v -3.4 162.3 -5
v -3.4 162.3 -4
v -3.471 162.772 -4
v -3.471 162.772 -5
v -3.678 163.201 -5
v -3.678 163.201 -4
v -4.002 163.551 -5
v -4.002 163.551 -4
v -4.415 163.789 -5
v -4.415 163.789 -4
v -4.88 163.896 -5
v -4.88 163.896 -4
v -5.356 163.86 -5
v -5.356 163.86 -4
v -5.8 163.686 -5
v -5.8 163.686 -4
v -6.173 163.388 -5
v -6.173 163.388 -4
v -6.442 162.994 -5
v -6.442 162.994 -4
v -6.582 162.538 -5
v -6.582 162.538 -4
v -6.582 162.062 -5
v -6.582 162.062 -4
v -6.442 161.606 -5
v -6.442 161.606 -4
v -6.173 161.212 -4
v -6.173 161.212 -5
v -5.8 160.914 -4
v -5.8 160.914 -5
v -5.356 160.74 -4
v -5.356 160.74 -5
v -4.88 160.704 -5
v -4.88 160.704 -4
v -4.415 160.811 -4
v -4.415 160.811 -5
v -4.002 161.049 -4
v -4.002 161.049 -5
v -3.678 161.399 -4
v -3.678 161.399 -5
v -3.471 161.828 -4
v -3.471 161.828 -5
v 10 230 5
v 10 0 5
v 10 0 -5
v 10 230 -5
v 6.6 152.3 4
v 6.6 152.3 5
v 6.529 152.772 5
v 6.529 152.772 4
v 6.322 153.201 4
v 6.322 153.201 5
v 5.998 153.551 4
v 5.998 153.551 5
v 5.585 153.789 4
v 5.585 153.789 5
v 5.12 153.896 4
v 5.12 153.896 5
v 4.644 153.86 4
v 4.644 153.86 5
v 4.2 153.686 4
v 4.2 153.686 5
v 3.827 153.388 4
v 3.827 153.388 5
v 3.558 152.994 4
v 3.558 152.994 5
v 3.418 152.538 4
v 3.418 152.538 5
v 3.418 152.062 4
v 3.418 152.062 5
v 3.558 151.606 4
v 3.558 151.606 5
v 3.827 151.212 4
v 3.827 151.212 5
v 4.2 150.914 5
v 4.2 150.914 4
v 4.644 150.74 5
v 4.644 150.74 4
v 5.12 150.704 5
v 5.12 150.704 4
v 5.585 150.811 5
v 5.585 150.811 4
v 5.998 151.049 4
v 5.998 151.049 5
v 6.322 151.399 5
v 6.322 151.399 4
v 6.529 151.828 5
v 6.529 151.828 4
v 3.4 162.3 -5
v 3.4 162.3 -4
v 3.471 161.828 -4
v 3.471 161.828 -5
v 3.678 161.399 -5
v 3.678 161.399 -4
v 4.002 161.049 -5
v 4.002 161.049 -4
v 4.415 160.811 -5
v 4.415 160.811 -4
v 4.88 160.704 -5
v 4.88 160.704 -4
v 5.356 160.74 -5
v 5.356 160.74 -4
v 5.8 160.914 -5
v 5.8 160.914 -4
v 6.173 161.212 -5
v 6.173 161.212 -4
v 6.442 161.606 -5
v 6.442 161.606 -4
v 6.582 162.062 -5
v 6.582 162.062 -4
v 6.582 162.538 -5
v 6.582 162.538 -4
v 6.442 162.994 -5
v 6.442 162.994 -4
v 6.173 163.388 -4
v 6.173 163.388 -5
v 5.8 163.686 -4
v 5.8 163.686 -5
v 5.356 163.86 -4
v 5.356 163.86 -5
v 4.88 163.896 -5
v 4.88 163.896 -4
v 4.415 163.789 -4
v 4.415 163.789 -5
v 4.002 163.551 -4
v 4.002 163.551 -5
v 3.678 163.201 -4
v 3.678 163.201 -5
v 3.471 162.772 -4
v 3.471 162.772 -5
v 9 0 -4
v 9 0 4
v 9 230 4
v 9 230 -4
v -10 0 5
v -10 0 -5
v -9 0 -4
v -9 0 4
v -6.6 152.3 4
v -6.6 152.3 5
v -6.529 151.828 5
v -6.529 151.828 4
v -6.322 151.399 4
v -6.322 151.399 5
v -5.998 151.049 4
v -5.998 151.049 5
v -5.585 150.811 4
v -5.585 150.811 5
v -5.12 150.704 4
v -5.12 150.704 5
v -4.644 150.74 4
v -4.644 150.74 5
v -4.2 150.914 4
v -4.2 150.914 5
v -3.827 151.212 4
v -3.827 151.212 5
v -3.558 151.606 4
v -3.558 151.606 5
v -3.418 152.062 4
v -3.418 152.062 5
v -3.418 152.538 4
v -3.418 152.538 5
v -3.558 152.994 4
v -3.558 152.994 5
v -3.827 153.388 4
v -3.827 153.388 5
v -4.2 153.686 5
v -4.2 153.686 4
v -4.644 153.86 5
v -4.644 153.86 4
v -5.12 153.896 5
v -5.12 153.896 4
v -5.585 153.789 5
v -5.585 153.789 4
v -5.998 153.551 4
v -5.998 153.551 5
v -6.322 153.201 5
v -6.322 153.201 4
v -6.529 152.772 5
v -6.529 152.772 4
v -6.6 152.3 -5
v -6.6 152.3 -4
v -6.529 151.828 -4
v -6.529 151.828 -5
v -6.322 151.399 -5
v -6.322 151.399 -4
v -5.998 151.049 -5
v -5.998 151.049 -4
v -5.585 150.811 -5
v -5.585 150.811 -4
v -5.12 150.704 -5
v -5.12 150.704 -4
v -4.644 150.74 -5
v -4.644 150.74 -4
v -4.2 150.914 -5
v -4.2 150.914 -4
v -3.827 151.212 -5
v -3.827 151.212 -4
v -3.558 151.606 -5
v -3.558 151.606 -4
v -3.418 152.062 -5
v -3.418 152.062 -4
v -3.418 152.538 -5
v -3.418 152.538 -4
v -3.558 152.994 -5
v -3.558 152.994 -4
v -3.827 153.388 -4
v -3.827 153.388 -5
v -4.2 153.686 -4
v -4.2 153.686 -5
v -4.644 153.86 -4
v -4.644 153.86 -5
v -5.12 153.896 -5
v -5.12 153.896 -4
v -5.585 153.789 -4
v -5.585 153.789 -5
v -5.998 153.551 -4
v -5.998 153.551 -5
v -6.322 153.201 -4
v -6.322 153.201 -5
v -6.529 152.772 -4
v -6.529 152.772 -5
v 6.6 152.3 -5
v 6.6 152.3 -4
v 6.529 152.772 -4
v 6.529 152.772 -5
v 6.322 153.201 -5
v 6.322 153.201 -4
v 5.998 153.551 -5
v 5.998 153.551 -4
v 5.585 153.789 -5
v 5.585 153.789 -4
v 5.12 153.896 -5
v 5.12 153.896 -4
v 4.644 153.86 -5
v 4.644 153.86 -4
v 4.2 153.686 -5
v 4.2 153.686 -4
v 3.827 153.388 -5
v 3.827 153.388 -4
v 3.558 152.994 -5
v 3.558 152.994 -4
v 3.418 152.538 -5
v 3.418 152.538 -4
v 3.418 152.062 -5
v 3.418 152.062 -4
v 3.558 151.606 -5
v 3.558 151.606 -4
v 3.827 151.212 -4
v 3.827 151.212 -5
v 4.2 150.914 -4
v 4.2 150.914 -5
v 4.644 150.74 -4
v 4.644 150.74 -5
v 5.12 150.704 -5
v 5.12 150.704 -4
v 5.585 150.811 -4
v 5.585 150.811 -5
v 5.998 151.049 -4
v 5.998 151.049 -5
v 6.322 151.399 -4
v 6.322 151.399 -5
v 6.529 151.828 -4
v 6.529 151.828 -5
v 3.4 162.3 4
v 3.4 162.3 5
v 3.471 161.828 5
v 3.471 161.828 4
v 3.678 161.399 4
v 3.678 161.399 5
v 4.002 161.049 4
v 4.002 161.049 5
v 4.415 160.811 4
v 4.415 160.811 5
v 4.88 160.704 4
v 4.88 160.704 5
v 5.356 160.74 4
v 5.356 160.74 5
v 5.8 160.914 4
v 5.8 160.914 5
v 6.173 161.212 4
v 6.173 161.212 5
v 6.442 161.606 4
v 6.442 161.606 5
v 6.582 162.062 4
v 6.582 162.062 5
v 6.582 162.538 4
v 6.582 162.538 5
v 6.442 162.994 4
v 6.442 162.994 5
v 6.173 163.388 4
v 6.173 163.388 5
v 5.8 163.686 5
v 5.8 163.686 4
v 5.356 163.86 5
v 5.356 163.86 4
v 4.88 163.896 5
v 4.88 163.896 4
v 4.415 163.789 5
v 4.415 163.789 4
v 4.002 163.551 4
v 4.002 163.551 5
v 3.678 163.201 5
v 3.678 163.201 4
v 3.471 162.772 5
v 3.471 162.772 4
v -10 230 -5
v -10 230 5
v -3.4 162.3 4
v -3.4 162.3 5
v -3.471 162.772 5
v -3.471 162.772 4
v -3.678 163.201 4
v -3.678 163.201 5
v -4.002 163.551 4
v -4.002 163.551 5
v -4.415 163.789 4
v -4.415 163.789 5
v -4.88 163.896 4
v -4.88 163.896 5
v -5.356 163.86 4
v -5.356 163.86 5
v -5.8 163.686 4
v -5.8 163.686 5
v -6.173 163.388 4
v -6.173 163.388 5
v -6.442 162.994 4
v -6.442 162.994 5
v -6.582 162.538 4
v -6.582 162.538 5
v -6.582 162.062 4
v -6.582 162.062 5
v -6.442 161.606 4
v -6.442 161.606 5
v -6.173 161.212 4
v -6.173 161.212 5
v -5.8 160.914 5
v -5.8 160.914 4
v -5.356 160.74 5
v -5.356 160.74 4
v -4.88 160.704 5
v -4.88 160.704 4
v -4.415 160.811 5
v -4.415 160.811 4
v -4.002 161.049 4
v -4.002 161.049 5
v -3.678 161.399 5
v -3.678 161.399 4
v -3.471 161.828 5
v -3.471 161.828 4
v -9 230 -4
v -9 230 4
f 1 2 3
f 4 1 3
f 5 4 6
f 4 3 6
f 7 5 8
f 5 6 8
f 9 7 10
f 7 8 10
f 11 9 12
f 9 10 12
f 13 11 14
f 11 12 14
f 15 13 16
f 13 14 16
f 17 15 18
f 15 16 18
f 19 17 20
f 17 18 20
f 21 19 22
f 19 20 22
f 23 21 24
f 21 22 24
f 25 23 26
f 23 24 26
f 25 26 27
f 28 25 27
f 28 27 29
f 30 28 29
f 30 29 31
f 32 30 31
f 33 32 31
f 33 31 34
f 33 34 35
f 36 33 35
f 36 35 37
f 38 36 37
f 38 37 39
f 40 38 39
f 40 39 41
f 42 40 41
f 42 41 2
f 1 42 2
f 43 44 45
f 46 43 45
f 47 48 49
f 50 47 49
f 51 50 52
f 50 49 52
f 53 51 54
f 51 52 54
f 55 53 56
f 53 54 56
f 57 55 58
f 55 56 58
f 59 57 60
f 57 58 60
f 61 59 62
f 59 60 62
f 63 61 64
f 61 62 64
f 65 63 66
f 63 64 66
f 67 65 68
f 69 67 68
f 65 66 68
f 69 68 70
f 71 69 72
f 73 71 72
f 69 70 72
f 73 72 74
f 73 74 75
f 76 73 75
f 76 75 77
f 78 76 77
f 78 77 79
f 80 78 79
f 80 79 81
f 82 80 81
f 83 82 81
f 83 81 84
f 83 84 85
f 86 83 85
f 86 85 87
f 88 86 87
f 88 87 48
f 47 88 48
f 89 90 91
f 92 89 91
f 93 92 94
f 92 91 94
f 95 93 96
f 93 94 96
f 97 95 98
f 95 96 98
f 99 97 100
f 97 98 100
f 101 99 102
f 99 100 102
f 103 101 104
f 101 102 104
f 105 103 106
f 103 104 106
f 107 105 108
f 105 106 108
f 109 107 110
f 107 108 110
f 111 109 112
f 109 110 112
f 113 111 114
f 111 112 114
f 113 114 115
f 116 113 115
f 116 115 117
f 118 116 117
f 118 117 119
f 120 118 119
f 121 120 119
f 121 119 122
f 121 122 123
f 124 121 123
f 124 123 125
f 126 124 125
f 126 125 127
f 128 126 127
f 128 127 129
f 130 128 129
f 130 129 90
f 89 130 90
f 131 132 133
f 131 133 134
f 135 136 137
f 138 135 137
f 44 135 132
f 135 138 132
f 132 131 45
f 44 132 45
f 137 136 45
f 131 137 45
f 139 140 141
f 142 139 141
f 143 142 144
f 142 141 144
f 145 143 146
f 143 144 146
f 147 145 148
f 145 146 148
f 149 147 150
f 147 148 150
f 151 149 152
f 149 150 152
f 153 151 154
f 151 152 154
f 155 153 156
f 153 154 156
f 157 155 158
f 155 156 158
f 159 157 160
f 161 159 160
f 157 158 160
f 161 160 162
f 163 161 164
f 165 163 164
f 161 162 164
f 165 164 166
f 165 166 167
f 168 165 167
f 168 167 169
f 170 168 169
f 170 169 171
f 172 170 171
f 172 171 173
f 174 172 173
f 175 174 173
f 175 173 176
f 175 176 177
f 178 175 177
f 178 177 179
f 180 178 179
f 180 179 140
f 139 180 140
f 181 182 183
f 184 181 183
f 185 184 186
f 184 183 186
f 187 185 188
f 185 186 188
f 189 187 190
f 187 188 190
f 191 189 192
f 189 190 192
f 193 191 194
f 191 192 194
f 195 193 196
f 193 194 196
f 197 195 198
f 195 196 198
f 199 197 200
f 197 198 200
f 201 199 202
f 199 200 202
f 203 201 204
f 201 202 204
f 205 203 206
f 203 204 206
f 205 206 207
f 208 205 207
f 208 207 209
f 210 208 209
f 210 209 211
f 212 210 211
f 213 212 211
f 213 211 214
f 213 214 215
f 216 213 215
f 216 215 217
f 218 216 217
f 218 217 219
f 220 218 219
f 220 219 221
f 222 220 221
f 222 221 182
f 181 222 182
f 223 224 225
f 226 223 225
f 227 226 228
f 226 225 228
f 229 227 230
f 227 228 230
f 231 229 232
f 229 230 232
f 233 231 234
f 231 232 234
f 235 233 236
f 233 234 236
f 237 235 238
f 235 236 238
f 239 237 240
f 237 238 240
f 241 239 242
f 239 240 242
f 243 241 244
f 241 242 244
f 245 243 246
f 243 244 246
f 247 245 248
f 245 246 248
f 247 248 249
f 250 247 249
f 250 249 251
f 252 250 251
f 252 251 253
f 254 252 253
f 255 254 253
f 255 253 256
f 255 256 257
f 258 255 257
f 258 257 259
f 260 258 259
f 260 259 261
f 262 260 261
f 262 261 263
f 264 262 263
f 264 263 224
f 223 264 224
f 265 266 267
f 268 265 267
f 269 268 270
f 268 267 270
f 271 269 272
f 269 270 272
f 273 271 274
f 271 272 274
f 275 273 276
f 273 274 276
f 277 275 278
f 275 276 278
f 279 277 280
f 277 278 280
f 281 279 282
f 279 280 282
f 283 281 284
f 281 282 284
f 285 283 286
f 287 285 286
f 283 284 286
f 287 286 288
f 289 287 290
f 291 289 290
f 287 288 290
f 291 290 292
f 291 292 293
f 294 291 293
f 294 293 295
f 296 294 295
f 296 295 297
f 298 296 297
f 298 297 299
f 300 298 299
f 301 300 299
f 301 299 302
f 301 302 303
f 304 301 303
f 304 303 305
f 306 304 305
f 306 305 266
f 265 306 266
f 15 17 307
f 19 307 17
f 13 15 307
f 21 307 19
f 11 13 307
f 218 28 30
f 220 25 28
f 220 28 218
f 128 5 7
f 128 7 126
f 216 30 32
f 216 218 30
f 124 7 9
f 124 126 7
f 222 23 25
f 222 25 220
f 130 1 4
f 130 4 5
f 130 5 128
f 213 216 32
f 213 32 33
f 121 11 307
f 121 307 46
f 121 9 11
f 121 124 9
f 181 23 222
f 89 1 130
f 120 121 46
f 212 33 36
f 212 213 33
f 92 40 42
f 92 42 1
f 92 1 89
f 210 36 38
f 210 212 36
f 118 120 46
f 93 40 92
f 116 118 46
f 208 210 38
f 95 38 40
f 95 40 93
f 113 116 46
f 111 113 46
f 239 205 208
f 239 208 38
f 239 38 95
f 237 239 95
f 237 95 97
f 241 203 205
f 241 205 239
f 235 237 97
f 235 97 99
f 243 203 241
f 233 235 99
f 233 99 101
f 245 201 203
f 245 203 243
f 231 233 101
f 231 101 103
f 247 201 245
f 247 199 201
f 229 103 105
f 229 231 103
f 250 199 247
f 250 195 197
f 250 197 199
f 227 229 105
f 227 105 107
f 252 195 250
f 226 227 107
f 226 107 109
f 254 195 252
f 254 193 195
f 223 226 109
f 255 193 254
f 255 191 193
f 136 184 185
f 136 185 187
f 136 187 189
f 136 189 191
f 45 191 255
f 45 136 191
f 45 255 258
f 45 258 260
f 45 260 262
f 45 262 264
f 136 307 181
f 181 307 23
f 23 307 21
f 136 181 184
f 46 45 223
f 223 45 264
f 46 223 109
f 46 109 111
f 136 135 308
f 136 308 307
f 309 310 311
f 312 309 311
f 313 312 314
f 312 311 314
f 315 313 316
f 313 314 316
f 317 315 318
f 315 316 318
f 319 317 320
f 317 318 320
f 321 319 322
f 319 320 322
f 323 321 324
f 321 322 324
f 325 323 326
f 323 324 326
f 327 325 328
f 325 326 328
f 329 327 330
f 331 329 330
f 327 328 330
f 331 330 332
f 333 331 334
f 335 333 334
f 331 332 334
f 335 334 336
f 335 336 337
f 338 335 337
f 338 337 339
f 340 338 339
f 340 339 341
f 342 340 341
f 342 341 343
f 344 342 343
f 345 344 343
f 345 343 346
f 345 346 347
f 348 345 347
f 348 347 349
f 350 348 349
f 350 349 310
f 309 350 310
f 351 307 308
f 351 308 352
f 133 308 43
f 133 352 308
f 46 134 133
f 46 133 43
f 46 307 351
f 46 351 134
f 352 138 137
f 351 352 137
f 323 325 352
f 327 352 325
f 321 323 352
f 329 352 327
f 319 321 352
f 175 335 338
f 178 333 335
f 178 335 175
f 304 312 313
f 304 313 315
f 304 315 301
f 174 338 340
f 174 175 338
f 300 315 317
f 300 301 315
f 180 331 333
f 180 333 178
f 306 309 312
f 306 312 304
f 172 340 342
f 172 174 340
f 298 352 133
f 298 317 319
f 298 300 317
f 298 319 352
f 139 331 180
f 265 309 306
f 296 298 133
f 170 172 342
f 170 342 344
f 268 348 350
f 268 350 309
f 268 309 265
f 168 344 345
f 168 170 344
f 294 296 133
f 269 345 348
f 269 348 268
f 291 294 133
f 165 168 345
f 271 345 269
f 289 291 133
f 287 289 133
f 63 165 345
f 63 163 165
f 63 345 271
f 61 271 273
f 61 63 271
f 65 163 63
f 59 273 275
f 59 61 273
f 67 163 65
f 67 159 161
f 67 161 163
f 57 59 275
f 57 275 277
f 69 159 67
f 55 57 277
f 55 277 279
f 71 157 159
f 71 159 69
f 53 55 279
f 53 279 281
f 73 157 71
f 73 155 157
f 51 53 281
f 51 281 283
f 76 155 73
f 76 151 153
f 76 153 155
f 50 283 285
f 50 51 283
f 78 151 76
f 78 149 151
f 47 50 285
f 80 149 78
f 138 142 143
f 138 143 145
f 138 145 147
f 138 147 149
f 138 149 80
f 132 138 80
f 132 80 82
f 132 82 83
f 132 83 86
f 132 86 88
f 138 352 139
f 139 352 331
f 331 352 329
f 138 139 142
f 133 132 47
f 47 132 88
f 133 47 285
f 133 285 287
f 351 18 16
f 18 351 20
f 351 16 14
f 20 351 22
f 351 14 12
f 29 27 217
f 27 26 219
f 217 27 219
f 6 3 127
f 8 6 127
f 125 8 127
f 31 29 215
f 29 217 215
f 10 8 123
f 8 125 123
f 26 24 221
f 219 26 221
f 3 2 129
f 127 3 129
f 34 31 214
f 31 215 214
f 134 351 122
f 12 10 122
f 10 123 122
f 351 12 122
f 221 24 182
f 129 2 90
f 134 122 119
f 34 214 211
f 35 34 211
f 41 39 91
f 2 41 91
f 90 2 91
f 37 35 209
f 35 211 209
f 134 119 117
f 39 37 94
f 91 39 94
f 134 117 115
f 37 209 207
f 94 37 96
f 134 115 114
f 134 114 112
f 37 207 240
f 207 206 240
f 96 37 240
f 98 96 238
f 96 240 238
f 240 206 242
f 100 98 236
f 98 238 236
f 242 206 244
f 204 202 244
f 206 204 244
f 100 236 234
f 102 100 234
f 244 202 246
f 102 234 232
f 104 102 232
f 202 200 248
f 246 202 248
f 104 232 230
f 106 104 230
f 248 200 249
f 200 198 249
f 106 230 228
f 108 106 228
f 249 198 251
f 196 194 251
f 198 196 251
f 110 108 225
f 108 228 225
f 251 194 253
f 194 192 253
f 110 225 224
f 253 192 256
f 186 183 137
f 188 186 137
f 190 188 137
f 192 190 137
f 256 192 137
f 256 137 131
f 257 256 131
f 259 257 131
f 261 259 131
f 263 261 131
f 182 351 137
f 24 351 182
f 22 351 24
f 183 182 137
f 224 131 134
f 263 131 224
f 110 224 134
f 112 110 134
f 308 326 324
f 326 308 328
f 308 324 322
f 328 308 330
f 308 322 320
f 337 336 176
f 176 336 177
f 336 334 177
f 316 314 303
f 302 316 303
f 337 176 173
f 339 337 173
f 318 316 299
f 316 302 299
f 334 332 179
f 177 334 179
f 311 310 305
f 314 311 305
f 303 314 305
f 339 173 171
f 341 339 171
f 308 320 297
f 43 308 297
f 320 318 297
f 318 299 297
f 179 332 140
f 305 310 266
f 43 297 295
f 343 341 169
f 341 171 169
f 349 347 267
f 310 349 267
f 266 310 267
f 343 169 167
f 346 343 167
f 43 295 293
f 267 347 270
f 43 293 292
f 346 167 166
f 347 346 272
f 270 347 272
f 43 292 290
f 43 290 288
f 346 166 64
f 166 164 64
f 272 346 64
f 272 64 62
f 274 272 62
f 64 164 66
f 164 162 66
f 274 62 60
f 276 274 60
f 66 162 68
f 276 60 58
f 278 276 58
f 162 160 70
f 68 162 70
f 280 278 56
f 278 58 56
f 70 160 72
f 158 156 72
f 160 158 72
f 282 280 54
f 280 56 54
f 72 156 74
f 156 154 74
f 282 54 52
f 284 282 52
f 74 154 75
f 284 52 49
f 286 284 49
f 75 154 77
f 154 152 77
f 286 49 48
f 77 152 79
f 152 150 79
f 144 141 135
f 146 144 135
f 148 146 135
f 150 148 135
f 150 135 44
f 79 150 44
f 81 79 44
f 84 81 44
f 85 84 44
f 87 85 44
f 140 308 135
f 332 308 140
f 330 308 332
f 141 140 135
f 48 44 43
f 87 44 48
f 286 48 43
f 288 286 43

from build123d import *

# Parameters (mm, degrees)
SKETCH_1_W          = 20
SKETCH_1_H          = 10
SKETCH_1_W_2        = 18
SKETCH_1_H_2        = 8
EXTRUDE_1_DEPTH     = 230
SKETCH_3_R          = 1.6
CUT_EXTRUDE_1_DEPTH = 231.434372436


with BuildPart() as part:
    # 草图1 → 拉伸-薄壁1 (new body)
    with BuildSketch(Plane(origin=(0, 0, 0), x_dir=(1, 0, 0), z_dir=(0, 1, 0))):
        Rectangle(SKETCH_1_W, SKETCH_1_H)
        Rectangle(SKETCH_1_W_2, SKETCH_1_H_2, mode=Mode.SUBTRACT)
    extrude(amount=EXTRUDE_1_DEPTH)

    # 草图3 → 切除-拉伸1 (cut, through all)
    with BuildSketch(Plane.XY.offset(5)):
        with Locations((-5, 162.3)):
            Circle(SKETCH_3_R)
        with Locations(Location((-5, 152.3, 0), (0, 0, 180))):
            Circle(SKETCH_3_R)
        with Locations((5, 152.3)):
            Circle(SKETCH_3_R)
        with Locations(Location((5, 162.3, 0), (0, 0, 180))):
            Circle(SKETCH_3_R)
    extrude(amount=-CUT_EXTRUDE_1_DEPTH, mode=Mode.SUBTRACT)


solid = part.part
